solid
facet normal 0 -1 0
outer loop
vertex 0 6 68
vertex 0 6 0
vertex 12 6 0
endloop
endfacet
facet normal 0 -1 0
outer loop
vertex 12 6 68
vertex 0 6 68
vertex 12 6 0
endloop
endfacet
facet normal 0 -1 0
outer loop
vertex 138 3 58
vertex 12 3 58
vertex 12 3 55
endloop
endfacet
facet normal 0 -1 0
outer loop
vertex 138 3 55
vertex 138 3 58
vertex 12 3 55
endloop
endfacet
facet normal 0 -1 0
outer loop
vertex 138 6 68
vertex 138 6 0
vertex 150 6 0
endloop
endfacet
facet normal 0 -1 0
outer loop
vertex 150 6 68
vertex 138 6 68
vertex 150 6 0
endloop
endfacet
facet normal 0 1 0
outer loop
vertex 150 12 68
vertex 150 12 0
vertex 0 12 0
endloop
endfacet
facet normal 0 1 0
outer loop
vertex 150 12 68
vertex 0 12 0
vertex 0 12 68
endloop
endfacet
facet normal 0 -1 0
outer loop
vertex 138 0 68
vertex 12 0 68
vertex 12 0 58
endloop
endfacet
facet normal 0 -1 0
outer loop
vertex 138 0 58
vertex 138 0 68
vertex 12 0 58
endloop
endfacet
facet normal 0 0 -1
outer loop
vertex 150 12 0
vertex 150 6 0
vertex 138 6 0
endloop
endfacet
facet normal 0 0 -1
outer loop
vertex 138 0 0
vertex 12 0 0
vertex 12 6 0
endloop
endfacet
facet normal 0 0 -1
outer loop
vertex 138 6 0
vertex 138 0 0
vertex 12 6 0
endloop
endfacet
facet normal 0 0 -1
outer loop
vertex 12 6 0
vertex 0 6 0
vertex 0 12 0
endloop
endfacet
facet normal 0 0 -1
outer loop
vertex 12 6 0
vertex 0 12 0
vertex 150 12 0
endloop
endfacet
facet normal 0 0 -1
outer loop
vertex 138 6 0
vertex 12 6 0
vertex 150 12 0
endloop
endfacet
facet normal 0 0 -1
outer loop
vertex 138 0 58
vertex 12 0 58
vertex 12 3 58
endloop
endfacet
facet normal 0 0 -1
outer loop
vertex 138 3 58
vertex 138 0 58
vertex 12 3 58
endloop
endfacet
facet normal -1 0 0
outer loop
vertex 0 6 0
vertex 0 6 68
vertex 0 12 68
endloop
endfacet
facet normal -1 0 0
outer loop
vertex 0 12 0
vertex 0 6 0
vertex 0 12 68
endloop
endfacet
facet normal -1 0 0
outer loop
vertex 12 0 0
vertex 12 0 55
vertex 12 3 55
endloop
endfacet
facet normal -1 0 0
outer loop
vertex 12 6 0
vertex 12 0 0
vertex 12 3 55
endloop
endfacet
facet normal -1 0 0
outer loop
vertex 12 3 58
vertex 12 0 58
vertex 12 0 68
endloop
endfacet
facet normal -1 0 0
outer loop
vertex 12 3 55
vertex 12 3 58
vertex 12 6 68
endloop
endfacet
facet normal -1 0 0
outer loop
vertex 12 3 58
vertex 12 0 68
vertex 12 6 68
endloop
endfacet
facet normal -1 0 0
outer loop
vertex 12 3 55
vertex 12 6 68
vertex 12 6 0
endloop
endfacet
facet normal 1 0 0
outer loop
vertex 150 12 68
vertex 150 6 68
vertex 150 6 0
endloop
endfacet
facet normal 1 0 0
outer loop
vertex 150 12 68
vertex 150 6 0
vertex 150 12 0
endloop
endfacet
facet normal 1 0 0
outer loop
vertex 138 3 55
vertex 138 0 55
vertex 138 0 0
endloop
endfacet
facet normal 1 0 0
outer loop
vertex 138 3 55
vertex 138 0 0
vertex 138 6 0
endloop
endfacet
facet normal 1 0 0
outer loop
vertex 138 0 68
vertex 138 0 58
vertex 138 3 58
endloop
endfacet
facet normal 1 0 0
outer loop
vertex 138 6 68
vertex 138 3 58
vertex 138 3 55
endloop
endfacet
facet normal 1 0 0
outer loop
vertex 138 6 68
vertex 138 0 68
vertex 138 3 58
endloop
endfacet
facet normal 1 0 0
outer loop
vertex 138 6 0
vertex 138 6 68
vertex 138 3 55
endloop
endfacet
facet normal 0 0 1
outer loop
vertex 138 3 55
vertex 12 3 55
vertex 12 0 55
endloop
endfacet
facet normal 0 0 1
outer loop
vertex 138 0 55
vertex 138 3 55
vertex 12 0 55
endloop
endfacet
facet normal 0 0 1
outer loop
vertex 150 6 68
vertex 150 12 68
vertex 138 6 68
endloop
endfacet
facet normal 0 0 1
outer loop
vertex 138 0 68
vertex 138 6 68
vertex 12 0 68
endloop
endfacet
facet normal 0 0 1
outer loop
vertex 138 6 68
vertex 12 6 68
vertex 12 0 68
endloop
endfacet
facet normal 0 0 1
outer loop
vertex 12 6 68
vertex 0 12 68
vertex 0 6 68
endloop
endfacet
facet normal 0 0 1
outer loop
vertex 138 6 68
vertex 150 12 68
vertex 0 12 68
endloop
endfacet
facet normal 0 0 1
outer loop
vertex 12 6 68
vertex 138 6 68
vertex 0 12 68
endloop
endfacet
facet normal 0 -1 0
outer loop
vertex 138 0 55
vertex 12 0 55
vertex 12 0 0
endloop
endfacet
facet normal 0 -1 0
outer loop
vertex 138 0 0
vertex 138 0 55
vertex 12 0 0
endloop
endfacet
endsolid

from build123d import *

# Parameters (mm, degrees)
F1_DEPTH = 150
F2_W     = 12
F2_H     = 6
F3_DEPTH = 108.3


with BuildPart() as f1:
    # F0 (on Right) → F1 (new body)
    with BuildSketch(Plane.YZ):
        Polygon((0, 55), (0, 0), (12, 0), (12, 68), (0, 68), (0, 58), (3, 58), (3, 55), align=None)
    extrude(amount=F1_DEPTH)

    # F2 (on face) → F3 (cut)
    with BuildSketch(Plane.XY.offset(68)):
        with Locations((6, 3)):
            Rectangle(F2_W, F2_H)
        with Locations((144, 3)):
            Rectangle(F2_W, F2_H)
    extrude(amount=-F3_DEPTH, mode=Mode.SUBTRACT)


solid = f1.part
